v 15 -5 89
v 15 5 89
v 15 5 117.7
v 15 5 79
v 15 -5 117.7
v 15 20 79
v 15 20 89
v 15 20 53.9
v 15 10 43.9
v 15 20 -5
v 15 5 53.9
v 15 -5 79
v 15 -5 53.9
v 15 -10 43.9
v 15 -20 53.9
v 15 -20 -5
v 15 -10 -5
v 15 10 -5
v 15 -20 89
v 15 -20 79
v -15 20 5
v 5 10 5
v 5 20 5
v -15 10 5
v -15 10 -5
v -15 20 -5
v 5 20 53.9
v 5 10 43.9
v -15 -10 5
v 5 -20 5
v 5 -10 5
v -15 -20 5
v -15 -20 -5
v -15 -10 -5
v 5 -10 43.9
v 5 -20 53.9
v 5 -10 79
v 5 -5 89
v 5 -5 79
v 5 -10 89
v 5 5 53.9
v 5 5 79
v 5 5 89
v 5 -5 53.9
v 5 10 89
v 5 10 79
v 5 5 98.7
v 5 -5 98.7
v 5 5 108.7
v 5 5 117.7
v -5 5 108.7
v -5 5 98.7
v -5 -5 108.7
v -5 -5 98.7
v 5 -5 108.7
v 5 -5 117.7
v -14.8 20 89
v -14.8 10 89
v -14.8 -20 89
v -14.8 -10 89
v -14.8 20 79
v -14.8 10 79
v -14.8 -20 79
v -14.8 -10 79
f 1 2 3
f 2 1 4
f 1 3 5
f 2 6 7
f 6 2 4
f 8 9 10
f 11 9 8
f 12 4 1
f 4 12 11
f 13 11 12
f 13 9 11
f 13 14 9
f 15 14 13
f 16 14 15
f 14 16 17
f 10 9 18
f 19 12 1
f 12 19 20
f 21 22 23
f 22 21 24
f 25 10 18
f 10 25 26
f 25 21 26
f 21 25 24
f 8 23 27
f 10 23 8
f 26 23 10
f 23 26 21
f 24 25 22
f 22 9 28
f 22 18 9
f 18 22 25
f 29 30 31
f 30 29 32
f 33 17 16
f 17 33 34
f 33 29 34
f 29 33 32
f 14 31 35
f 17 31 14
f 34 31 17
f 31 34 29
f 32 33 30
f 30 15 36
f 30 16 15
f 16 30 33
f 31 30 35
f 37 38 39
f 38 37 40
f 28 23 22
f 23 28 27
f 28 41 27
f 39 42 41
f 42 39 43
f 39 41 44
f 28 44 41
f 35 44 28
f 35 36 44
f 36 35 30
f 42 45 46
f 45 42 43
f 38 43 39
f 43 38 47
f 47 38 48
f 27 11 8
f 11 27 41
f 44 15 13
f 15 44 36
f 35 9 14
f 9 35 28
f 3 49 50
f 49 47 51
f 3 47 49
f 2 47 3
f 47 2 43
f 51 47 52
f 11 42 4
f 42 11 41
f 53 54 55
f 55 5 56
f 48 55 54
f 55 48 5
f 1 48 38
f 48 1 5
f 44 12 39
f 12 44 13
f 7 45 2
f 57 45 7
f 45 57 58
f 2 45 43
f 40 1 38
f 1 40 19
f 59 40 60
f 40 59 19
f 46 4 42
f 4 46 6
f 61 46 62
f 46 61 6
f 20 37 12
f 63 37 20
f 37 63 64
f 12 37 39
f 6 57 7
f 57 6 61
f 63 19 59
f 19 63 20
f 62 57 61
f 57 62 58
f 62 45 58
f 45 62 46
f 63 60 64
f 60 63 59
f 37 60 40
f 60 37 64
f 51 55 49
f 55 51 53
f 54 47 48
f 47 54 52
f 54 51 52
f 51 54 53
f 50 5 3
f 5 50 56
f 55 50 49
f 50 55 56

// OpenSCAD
//left Foot
translate([0,15,0])
cube([30,10,10],center=true);
//right Foot
translate([0,-15,0])
cube([30,10,10],center=true);
//left Leg
translate([5,10,4.9])
cube([10,10,40]);
//right Leg
translate([5,-20,4.9])
cube([10,10,40]);

//Pelvis
translate([5,-20,43.9])
cube([10,40,10]);

//Spine
translate([5,-5,53.5])
cube([10,10,35]);

//shoulders
translate([10,0,84])
cube([10,40,10],center=true);

//right arm
translate([-4.8,15,84])
cube([20,10,10],center=true);

//left arm
translate([-4.8,-15,84])
cube([20,10,10],center=true);

//neck
translate([10,0,93.8])
cube([10,10,11],center=true);

//head
translate([5,0,103.7])
cube([20,10,10],center=true);

//hat
translate([10,0,112.7])
cube([10,10,10],center=true);
